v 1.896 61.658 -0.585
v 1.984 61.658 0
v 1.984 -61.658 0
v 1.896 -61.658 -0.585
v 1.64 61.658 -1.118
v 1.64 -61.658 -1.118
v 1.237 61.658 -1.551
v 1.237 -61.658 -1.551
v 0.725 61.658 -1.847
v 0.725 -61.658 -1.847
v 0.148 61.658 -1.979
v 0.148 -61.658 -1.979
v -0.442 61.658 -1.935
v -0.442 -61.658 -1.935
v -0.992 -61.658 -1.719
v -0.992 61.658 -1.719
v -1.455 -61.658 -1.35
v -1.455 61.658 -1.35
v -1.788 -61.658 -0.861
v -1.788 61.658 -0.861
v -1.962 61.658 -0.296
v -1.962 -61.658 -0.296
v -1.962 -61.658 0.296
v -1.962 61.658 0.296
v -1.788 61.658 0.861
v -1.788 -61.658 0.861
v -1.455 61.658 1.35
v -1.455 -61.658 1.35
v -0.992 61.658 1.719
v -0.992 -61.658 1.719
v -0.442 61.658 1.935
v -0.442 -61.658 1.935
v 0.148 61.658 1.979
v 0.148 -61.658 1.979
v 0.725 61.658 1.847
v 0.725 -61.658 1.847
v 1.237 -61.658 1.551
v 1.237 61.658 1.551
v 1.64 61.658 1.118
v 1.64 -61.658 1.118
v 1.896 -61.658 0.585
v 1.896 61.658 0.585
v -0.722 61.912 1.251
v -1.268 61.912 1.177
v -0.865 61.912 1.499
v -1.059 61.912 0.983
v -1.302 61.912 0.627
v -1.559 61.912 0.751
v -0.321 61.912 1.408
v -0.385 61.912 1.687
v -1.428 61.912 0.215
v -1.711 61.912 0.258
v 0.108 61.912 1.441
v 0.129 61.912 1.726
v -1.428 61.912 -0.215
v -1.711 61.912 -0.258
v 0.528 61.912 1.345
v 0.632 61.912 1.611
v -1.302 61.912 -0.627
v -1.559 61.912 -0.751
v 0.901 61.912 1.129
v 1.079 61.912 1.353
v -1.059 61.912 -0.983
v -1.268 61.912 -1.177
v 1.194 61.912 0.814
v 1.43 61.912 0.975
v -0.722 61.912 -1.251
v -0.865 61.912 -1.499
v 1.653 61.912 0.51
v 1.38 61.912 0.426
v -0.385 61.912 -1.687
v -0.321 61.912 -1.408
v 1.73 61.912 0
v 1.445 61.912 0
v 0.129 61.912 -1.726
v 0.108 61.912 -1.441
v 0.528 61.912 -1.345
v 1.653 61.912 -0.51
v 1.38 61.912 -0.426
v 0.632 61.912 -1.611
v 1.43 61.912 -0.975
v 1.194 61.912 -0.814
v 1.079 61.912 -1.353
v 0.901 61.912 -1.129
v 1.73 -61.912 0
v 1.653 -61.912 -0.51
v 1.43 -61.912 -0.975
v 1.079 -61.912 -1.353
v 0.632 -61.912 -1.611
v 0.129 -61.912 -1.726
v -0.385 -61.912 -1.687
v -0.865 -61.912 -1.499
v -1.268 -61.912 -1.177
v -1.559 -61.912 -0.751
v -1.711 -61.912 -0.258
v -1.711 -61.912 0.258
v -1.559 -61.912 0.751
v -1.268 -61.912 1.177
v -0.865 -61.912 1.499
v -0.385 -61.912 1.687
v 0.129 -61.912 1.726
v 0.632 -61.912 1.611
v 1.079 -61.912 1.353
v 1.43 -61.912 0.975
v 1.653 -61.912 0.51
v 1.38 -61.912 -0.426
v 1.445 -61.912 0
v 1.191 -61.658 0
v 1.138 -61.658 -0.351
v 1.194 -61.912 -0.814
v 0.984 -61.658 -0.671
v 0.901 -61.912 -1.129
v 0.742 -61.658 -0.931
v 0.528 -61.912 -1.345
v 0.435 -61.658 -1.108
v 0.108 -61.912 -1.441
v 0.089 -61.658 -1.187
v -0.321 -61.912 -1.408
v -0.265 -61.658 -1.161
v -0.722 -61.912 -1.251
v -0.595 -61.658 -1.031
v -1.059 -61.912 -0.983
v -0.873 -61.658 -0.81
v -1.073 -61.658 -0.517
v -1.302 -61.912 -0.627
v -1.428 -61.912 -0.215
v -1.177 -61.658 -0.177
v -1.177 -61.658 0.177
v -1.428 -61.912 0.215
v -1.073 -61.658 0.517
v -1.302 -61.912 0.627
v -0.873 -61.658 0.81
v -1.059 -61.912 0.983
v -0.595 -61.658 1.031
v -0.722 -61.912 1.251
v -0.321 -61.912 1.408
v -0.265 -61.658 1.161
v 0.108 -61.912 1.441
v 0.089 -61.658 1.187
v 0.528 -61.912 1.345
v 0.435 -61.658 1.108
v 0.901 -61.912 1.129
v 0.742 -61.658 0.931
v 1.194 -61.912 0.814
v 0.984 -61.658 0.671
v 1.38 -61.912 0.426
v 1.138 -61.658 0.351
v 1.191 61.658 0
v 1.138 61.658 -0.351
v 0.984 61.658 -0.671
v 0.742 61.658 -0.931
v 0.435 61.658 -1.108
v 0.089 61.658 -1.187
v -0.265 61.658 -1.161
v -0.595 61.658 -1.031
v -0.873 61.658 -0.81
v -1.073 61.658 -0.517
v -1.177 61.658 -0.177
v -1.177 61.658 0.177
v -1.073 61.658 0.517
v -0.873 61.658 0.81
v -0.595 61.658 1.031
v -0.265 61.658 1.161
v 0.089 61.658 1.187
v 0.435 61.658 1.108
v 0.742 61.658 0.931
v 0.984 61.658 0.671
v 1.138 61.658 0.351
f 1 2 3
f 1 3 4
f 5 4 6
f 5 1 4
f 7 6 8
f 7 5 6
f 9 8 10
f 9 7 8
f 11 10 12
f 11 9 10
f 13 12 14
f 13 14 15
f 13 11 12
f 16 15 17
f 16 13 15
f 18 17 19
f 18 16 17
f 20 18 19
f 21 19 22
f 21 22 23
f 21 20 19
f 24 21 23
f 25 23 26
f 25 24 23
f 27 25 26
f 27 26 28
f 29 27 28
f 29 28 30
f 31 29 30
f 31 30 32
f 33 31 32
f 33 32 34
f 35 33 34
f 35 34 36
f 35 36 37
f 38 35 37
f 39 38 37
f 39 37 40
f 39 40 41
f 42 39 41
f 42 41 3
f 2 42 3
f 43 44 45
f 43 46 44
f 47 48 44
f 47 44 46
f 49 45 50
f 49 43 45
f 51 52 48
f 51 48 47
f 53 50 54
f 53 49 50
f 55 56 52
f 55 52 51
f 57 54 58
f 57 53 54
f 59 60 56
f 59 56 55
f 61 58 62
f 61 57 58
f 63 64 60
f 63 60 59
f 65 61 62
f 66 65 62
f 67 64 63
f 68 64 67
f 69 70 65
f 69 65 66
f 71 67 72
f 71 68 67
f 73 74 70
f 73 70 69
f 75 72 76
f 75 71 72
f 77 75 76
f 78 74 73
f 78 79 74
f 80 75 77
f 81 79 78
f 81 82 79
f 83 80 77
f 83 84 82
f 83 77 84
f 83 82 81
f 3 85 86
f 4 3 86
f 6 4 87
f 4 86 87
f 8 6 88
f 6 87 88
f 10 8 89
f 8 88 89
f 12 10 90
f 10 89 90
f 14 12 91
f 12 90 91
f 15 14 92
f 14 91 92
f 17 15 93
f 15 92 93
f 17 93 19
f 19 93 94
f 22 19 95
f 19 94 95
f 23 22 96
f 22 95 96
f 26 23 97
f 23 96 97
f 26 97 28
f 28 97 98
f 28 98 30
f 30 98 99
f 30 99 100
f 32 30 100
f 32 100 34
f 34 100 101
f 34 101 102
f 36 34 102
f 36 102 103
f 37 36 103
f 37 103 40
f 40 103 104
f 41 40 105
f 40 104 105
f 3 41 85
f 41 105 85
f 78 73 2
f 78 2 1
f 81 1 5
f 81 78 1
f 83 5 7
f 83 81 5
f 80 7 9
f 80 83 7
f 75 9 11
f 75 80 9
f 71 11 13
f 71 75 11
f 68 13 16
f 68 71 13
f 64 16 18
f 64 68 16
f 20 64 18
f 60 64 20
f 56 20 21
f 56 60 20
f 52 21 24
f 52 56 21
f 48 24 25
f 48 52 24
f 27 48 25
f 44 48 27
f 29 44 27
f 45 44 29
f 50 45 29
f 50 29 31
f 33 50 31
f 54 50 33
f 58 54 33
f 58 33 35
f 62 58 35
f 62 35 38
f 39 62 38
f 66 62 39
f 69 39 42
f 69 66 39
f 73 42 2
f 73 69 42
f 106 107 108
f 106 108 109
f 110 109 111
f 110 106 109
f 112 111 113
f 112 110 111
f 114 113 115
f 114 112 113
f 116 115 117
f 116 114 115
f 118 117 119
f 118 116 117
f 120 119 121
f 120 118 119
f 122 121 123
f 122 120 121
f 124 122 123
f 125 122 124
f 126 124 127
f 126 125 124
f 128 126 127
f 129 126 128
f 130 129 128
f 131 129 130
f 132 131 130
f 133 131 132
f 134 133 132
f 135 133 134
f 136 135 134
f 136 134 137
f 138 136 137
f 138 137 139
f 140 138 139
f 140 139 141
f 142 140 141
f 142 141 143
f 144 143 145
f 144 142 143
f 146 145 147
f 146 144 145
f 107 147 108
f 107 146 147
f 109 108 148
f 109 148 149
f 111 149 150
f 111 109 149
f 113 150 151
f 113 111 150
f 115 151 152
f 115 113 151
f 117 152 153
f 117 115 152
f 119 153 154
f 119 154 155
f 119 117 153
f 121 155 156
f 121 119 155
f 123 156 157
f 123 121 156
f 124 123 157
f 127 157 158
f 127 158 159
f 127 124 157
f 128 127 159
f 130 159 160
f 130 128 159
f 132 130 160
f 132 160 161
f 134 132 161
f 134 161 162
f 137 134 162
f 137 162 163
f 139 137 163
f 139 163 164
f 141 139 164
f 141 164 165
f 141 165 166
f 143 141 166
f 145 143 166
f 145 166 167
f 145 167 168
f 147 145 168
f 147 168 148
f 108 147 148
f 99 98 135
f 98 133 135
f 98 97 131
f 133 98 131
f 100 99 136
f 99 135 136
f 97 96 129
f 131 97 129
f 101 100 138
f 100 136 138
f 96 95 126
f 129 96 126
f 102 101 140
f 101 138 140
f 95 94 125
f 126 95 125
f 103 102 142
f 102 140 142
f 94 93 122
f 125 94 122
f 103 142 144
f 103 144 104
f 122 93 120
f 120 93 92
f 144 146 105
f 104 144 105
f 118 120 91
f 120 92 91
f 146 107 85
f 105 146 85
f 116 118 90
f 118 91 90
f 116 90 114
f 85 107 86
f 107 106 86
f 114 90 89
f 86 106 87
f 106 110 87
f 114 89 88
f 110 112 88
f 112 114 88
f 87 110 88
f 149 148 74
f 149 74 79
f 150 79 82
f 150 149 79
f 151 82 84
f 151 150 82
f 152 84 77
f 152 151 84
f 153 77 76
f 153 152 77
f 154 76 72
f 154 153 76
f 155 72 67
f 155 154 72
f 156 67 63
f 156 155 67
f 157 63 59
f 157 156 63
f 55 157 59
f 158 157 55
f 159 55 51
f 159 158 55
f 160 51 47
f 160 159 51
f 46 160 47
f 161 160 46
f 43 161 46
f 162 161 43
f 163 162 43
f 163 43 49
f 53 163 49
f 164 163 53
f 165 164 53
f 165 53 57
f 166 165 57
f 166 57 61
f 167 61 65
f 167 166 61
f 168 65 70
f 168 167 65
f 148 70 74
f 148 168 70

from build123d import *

# Parameters (mm, degrees)
SKETCH1_R           = 1.984375
SKETCH1_R_2         = 1.190625
BOSS_EXTRUDE1_DEPTH = 61.9125
CHAMFER1_SIZE       = 0.254


with BuildPart() as part:
    # Sketch1 → Boss-Extrude1 (new body, symmetric)
    with BuildSketch(Plane(origin=(0, 0, 0), x_dir=(1, 0, 0), z_dir=(0, 1, 0))):
        Circle(SKETCH1_R)
        Circle(SKETCH1_R_2, mode=Mode.SUBTRACT)
    extrude(amount=BOSS_EXTRUDE1_DEPTH, both=True)

    # Chamfer1
    chamfer1_edges = [part.edges().sort_by_distance(p)[0] for p in [
        (-1.984375, -61.9125, 0),
        (-1.984375, 61.9125, 0),
        (-1.190625, -61.9125, 0),
        (-1.190625, 61.9125, 0),
    ]]
    chamfer(chamfer1_edges, length=CHAMFER1_SIZE)


solid = part.part
